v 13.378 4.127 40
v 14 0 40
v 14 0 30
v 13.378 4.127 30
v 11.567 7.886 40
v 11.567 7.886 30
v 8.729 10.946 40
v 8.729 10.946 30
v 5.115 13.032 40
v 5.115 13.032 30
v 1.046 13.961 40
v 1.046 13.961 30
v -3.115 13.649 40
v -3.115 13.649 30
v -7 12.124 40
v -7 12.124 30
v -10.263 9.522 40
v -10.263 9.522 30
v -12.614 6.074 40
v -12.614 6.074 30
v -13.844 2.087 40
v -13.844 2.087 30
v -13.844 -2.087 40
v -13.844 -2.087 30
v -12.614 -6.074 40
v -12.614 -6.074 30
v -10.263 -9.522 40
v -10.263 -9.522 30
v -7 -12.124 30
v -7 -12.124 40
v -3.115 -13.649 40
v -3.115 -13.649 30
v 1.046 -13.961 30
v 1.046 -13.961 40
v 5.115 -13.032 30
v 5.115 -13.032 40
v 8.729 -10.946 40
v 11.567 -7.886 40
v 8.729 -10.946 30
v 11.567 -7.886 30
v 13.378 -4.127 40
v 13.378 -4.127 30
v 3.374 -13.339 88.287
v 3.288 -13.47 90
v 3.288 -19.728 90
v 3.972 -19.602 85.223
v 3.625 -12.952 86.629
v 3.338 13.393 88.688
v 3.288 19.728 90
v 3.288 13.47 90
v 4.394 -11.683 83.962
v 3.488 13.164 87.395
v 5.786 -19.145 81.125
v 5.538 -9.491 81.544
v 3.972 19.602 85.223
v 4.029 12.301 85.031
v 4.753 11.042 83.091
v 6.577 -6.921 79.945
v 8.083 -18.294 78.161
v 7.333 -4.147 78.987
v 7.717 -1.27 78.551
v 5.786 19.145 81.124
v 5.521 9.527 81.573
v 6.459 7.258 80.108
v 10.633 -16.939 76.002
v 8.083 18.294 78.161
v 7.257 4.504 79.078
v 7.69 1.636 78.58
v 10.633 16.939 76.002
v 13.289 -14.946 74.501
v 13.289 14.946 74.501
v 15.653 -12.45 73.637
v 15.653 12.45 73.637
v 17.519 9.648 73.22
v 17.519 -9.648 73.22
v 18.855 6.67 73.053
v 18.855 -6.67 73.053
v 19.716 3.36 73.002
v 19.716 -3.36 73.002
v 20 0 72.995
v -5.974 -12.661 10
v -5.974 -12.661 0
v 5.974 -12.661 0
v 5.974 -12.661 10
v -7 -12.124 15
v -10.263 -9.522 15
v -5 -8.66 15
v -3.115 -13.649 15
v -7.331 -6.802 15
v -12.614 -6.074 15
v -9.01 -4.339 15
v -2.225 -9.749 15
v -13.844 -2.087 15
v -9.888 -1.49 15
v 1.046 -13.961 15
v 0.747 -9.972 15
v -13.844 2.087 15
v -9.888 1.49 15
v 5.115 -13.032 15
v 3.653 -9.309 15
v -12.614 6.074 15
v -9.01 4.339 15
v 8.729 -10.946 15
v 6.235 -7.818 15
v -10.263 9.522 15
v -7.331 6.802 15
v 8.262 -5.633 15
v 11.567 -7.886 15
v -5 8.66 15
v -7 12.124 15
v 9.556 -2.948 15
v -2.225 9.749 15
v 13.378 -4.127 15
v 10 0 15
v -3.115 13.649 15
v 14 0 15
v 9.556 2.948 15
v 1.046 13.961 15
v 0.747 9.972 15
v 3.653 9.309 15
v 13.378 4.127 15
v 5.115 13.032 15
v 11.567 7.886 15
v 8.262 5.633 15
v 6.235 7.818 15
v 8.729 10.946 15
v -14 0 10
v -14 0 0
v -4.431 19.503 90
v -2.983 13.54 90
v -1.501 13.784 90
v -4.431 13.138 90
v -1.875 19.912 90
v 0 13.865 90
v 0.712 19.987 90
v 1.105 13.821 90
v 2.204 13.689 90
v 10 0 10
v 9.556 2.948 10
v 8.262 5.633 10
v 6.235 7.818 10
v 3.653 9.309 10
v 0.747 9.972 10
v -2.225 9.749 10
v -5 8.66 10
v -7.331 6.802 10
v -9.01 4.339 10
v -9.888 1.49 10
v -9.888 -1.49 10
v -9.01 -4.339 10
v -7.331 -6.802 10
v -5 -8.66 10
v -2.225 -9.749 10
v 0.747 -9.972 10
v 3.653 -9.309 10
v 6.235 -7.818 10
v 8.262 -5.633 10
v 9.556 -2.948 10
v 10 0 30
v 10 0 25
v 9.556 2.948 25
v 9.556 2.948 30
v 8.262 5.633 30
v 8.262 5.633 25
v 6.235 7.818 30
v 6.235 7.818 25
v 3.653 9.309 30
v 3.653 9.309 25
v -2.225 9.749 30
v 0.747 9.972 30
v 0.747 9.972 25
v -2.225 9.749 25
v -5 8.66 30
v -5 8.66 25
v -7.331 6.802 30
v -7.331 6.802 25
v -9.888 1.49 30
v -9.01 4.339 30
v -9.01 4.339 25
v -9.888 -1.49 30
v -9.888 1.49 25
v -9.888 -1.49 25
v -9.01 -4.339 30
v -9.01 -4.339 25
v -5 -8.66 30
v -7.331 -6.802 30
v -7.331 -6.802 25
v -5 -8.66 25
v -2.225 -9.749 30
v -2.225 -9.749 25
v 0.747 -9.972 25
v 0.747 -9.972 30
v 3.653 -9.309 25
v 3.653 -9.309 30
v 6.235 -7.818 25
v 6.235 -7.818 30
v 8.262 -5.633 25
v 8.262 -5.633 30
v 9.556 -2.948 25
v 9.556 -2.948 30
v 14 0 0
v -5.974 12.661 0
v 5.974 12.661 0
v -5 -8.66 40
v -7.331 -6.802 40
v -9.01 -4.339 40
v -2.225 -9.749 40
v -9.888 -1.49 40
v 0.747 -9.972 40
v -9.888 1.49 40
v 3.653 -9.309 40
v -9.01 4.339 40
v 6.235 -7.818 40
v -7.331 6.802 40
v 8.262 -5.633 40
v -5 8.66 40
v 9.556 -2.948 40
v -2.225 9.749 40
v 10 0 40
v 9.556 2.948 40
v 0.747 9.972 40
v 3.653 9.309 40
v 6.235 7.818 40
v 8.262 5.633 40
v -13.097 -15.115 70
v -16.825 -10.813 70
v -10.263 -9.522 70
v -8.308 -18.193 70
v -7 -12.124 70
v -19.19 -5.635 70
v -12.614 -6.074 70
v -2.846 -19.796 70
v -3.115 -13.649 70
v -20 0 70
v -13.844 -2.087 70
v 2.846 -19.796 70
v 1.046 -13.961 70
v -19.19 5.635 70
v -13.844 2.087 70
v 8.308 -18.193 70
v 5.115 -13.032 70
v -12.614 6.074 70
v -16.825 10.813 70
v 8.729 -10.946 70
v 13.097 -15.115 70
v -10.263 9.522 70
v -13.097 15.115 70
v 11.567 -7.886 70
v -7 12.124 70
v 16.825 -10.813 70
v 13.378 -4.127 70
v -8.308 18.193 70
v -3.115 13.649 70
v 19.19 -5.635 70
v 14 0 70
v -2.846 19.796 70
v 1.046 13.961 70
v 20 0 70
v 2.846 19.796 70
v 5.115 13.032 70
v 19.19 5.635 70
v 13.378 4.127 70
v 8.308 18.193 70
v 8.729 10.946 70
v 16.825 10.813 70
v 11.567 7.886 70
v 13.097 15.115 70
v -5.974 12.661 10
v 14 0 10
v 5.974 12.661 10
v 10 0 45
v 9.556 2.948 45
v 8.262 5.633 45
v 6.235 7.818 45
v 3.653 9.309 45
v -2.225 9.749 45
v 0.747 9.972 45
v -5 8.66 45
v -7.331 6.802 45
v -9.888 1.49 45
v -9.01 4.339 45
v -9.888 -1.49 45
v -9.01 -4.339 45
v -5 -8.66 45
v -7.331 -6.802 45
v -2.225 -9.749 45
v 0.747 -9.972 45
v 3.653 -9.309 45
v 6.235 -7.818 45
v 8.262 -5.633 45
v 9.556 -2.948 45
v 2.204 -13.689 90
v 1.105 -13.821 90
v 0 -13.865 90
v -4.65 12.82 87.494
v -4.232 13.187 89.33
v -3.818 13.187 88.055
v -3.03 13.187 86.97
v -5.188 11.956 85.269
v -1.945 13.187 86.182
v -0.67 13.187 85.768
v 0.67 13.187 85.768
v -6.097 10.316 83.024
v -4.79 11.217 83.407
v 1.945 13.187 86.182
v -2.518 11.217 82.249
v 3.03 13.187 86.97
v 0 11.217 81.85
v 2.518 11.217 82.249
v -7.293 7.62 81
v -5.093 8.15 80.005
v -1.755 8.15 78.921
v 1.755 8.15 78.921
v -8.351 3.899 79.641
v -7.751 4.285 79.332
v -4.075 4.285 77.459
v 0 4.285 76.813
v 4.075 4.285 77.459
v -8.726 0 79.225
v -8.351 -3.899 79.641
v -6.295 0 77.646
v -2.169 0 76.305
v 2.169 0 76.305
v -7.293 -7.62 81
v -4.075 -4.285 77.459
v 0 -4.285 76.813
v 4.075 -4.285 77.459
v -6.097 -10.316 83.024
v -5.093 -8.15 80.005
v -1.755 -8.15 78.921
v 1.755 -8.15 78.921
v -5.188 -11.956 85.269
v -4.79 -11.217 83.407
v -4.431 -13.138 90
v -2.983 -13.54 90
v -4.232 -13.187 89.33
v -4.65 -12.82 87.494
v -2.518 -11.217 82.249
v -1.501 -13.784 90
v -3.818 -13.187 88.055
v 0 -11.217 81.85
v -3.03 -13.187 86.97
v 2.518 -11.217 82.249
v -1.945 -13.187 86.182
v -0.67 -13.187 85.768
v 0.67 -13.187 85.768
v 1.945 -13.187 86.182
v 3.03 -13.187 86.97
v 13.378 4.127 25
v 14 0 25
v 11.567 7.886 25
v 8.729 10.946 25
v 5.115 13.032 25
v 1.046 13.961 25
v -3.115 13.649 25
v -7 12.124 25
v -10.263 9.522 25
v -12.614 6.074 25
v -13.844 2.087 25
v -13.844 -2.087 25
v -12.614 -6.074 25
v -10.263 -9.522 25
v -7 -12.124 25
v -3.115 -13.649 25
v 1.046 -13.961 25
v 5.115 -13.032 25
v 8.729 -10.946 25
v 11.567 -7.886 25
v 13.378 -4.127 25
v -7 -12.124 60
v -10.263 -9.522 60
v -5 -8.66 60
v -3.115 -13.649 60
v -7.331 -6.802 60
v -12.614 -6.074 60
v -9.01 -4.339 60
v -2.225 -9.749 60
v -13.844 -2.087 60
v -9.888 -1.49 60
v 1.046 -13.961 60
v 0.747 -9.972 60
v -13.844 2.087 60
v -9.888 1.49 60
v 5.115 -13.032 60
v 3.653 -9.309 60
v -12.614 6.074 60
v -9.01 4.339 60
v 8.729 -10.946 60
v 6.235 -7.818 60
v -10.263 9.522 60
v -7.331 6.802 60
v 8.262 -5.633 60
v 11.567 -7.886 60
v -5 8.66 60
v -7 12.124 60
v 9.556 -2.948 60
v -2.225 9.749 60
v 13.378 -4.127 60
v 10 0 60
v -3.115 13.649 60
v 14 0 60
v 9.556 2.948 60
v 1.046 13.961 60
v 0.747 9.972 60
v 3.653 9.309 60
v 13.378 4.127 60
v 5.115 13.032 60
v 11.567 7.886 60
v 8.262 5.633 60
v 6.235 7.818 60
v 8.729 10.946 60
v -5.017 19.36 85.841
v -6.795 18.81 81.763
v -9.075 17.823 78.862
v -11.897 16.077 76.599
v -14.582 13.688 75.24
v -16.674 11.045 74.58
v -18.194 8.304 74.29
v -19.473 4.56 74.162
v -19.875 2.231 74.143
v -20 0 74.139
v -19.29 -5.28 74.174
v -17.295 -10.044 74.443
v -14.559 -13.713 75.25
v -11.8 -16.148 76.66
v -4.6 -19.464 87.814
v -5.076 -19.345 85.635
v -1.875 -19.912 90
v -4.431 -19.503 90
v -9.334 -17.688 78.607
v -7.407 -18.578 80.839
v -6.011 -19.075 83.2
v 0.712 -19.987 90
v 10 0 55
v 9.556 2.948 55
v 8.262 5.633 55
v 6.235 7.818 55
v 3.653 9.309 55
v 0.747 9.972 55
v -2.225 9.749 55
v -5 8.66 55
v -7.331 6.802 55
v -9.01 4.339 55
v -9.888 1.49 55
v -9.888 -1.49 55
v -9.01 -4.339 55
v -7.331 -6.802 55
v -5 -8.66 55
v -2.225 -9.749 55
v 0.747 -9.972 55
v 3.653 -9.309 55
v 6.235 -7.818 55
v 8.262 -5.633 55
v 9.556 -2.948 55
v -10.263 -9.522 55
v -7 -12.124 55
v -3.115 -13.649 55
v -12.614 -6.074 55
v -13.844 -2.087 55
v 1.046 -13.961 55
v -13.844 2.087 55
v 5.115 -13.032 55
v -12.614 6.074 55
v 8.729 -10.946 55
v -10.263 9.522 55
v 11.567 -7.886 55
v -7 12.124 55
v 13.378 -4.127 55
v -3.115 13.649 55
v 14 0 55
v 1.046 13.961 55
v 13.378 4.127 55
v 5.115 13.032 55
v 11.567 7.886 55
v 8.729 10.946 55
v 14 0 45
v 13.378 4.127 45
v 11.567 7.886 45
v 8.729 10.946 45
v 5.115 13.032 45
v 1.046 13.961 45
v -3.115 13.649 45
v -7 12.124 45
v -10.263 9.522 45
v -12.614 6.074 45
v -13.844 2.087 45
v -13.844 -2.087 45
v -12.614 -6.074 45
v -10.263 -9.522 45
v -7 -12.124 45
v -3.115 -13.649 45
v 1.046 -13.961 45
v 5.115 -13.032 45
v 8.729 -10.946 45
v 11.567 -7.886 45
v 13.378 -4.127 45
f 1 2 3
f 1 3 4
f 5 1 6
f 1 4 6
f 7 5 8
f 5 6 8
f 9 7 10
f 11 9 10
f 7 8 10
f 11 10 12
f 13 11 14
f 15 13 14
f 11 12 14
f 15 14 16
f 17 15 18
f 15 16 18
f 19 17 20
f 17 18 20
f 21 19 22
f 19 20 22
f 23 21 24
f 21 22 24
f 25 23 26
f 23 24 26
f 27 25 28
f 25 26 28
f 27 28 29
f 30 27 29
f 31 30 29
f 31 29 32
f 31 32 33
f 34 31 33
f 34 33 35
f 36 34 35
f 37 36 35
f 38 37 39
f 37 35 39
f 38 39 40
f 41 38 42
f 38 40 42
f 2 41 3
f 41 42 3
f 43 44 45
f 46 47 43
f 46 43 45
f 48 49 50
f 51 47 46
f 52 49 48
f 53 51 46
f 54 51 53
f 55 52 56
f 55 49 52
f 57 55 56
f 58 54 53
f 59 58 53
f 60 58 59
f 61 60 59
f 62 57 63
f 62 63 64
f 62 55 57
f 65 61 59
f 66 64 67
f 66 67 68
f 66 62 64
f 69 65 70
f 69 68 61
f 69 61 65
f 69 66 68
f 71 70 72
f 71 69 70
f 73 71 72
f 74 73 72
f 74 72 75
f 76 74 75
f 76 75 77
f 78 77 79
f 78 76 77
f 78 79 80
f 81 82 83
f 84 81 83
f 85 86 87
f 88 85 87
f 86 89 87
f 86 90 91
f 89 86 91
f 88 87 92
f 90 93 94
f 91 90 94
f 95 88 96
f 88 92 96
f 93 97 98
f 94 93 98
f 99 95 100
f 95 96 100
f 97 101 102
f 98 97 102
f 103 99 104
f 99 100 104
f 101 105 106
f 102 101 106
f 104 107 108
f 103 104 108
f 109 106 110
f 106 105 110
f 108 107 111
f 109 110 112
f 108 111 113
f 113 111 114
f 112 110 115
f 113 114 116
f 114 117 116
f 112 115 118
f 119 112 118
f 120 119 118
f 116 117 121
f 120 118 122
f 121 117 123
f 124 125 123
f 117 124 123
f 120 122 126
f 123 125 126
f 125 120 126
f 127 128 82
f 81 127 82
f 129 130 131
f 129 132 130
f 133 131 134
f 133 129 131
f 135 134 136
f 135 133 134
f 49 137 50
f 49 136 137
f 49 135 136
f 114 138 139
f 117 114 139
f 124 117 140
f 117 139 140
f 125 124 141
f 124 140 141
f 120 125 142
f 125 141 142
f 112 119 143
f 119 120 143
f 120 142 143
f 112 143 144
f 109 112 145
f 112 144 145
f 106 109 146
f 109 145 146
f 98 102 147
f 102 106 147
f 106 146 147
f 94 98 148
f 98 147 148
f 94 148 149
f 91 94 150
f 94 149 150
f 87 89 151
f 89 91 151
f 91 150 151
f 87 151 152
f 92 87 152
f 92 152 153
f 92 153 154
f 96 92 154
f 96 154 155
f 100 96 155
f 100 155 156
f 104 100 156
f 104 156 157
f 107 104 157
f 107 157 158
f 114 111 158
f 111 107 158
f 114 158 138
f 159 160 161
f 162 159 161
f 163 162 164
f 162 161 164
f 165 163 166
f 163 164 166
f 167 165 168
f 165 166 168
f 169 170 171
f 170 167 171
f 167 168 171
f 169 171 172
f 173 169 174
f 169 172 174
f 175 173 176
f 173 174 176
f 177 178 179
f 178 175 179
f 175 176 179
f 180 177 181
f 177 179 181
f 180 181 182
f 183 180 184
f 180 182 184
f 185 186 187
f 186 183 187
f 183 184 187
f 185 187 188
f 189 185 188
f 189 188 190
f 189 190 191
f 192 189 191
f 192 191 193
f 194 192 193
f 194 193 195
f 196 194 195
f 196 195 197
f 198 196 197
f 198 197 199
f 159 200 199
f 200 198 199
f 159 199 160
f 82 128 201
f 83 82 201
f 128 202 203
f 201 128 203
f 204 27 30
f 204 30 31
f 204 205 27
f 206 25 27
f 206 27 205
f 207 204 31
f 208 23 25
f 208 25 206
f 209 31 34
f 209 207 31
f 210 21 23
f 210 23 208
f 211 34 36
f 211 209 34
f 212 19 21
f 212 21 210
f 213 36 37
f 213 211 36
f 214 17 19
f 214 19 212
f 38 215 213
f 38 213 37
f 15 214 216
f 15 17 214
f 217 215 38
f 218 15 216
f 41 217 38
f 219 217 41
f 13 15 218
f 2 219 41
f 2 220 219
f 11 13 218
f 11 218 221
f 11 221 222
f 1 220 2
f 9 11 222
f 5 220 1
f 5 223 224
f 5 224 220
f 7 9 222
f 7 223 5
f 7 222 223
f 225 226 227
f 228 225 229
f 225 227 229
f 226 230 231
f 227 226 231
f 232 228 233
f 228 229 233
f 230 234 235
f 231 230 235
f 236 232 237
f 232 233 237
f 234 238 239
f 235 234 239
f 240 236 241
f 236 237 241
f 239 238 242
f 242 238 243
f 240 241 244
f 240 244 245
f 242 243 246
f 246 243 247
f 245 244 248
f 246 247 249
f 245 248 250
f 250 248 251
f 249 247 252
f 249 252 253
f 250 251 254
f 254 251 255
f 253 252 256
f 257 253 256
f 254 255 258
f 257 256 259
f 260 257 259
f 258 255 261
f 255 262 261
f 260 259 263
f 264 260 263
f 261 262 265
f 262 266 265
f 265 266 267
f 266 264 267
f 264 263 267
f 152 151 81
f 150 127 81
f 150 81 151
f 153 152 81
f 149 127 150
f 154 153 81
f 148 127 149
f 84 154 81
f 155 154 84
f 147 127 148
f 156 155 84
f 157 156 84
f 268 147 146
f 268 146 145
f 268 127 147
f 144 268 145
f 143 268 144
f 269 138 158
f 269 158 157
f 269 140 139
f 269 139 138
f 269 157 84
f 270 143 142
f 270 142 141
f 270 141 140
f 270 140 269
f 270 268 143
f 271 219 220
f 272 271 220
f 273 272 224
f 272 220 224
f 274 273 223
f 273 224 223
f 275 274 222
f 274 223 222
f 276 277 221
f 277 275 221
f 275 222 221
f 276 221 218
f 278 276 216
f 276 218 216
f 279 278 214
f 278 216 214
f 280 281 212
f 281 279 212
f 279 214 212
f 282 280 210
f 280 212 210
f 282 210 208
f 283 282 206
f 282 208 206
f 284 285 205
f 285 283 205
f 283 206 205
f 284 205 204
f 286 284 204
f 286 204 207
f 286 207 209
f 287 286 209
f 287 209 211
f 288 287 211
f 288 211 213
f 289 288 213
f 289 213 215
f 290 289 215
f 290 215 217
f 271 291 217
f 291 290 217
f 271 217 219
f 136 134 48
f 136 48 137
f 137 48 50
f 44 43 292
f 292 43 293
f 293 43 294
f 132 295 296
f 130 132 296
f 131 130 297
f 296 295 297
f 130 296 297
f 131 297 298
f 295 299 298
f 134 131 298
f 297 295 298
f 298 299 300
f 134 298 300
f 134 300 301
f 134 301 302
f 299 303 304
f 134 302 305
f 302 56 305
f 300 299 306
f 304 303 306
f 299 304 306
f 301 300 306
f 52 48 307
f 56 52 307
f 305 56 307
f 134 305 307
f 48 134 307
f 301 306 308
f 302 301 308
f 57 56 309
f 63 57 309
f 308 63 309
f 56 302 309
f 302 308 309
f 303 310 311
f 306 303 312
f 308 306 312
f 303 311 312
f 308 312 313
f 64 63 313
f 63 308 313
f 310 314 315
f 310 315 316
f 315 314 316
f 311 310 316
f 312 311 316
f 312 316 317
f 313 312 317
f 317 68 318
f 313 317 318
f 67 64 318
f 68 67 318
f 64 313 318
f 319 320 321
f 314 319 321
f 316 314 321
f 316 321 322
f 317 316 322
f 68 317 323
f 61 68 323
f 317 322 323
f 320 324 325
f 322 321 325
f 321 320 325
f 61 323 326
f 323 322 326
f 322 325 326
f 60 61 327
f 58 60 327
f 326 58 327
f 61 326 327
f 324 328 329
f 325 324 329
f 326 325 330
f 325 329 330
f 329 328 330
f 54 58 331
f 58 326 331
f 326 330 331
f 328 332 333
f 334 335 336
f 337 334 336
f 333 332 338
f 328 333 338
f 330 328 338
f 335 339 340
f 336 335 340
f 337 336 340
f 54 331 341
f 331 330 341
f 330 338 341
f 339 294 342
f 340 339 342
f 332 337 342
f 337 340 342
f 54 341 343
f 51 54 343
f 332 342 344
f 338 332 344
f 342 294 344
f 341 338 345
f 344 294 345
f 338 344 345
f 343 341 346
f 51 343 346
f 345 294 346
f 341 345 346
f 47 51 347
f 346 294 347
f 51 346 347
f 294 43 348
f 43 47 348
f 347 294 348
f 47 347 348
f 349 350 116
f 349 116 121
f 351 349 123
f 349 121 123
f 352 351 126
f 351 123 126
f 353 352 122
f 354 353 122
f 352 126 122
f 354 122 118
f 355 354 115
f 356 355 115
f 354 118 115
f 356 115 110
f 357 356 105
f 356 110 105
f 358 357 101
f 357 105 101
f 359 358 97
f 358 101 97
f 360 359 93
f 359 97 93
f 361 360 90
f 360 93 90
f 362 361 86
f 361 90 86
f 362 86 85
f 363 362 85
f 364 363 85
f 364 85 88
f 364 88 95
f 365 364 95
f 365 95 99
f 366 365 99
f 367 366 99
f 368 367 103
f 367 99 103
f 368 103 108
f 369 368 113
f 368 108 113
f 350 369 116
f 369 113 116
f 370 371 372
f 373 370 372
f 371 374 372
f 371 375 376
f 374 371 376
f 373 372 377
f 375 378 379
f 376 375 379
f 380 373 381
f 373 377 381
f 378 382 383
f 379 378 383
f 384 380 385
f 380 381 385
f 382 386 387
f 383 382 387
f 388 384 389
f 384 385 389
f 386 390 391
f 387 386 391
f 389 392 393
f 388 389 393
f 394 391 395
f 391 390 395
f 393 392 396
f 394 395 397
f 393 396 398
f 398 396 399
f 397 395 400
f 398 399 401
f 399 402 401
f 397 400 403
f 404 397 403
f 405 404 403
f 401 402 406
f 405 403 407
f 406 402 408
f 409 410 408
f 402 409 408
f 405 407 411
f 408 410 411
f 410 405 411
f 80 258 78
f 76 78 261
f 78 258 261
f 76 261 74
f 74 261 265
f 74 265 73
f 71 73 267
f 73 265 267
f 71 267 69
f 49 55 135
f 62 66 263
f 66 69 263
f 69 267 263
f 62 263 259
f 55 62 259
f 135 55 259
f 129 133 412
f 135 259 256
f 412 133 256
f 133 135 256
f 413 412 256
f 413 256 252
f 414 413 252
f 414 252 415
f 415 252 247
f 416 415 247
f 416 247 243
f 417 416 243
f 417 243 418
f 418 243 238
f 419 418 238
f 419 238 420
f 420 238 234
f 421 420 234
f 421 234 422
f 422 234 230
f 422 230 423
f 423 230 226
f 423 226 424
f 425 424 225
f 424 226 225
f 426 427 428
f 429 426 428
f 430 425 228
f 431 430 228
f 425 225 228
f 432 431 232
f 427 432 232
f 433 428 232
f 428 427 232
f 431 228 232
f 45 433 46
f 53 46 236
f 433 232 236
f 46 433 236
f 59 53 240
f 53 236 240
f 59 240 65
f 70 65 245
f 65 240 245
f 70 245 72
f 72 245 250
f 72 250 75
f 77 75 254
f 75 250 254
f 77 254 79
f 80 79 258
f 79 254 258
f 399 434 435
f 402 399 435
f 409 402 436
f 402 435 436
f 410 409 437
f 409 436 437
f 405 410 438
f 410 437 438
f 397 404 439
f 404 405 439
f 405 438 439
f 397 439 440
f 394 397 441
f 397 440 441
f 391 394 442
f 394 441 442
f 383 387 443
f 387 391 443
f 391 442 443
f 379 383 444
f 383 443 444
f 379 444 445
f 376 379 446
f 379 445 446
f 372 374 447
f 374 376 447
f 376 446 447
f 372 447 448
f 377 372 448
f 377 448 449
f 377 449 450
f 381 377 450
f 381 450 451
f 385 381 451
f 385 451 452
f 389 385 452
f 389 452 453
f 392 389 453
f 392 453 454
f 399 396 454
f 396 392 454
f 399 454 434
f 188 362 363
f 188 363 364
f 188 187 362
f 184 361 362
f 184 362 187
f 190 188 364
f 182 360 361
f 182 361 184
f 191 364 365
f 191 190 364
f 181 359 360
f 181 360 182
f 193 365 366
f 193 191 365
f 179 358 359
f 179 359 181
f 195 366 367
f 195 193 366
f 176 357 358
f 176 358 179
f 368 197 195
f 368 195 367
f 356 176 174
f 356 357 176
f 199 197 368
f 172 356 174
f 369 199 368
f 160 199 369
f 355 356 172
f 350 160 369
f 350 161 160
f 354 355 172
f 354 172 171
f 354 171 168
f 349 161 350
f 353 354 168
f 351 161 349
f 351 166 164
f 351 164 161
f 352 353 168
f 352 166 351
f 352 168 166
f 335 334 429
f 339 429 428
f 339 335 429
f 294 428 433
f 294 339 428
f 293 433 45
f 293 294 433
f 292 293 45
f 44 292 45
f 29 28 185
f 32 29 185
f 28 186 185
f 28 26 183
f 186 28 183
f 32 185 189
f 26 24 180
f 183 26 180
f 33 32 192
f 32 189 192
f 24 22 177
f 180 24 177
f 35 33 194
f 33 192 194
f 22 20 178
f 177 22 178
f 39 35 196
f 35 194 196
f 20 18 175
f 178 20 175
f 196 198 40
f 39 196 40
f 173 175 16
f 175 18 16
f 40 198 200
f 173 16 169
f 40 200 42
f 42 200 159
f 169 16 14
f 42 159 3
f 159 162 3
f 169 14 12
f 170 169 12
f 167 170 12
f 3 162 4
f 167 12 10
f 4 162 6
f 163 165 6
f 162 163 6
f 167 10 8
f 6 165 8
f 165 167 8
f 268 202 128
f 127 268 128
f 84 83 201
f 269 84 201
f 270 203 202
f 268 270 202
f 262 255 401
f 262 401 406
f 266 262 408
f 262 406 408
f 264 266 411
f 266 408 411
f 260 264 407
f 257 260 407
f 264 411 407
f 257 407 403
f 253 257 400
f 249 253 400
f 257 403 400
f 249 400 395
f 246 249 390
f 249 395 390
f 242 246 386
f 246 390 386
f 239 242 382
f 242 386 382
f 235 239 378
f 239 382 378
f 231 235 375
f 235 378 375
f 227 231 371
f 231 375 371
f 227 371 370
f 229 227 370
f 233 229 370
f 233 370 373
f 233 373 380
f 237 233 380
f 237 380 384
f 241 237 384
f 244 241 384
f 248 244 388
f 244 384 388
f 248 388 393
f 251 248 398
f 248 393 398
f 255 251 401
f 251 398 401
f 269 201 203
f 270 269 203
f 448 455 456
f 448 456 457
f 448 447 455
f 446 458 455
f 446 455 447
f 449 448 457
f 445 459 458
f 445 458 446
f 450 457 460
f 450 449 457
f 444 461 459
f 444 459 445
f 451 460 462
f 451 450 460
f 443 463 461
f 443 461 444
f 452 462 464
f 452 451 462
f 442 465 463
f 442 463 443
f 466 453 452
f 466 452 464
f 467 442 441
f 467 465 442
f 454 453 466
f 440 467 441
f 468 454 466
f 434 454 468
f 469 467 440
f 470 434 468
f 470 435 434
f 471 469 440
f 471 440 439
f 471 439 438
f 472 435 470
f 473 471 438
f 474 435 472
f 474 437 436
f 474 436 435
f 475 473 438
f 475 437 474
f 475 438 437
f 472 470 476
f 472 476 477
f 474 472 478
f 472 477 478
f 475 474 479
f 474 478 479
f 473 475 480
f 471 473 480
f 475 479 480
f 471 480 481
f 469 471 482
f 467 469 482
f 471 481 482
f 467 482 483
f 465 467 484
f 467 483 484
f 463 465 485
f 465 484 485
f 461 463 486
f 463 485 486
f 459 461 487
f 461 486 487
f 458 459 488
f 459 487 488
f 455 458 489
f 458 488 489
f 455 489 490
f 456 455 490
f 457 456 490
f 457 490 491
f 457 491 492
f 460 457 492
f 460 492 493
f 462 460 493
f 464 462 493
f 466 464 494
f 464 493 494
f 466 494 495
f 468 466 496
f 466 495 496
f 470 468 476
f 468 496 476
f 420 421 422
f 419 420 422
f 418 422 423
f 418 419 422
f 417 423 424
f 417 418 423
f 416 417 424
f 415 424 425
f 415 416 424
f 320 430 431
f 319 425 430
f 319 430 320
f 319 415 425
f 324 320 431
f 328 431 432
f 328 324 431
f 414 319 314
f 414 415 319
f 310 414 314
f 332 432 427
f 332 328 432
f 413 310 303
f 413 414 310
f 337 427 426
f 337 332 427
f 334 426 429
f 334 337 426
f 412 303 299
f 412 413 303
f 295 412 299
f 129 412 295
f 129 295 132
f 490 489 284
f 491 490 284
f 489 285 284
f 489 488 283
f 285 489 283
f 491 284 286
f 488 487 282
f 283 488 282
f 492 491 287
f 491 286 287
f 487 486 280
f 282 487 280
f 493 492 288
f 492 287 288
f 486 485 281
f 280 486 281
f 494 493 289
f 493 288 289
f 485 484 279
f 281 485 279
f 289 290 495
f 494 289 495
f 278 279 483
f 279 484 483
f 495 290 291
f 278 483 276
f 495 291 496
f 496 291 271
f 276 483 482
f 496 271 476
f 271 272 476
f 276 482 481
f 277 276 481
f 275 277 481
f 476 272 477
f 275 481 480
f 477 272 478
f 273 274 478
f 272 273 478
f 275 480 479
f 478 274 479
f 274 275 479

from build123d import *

# Parameters (mm, degrees)
F0_R           = 10
F1_DEPTH       = 80
F3_DEPTH       = 10
F6_R           = 14
F7_DEPTH       = 10
F9_R           = 14
F10_DEPTH      = 10
F12_R          = 14
F13_DEPTH      = 10
F15_R          = 14
F16_DEPTH      = 10
F17_R          = 20
F18_DEPTH      = 20
F22_DEPTH      = 25
F22_DEPTH_BACK = 25
F23_R          = 16
F24_DEPTH      = 25
F24_DEPTH_BACK = 25


with BuildPart() as f1:
    # F0 (on Top) → F1 (new body)
    with BuildSketch(Plane.XY):
        Circle(F0_R)
    extrude(amount=F1_DEPTH)

    # F2 (on Top) → F3 (join)
    with BuildSketch(Plane.XY):
        Polygon((14, 0), (5.9740389772, 12.6613924313), (-0.0259610228, 12.6613924313), (-5.9740389772, 12.6613924313), (-14, 0), (-5.9740389772, -12.6613924313), (0.0259610228, -12.6613924313), (5.9740389772, -12.6613924313), align=None)
    extrude(amount=F3_DEPTH)

    # F6 (on offset) → F7 (join)
    with BuildSketch(Plane.XY.offset(15)):
        Circle(F6_R)
    extrude(amount=F7_DEPTH)

    # F9 (on offset) → F10 (join)
    with BuildSketch(Plane.XY.offset(30)):
        Circle(F9_R)
    extrude(amount=F10_DEPTH)

    # F12 (on offset) → F13 (join)
    with BuildSketch(Plane.XY.offset(45)):
        Circle(F12_R)
    extrude(amount=F13_DEPTH)

    # F15 (on offset) → F16 (join)
    with BuildSketch(Plane.XY.offset(60)):
        Circle(F15_R)
    extrude(amount=F16_DEPTH)

    # F17 (on face) → F18 (join)
    with BuildSketch(Plane.XY.offset(70)):
        Circle(F17_R)
    extrude(amount=F18_DEPTH)

    # F19 (on face) → F20 (revolve, cut)
    with BuildSketch(Plane.XY.offset(90)):
        with BuildLine():
            Line((0, -13.8652793043), (0, 13.8652793043))
            ThreePointArc((0, 13.8652793043), (-13.8652793043, 0), (0, -13.8652793043))
        make_face()
    revolve(axis=Axis((0, 0, 90), (0, -1, 0)), mode=Mode.SUBTRACT)

    # F21 (on Front) → F22 (cut, two sides)
    with BuildSketch(Plane.XZ) as f22_sk:
        with BuildLine():
            Line((20.291691646, 89.9962559342), (20.291691646, 107.0001030122))
            ThreePointArc((20.291691646, 107.0001030122), (3.287844568, 89.9962559342), (20.291691646, 72.9924088562))
            Line((20.291691646, 72.9924088562), (20.291691646, 89.9962559342))
        make_face()
    extrude(amount=F22_DEPTH, mode=Mode.SUBTRACT)
    extrude(f22_sk.sketch, amount=-F22_DEPTH_BACK, mode=Mode.SUBTRACT)

    # F23 (on Front) → F24 (cut, two sides)
    with BuildSketch(Plane.XZ) as f24_sk:
        with Locations((-20.4308144748, 90.1330336928)):
            Circle(F23_R)
    extrude(amount=-F24_DEPTH, mode=Mode.SUBTRACT)
    extrude(f24_sk.sketch, amount=F24_DEPTH_BACK, mode=Mode.SUBTRACT)


solid = f1.part
